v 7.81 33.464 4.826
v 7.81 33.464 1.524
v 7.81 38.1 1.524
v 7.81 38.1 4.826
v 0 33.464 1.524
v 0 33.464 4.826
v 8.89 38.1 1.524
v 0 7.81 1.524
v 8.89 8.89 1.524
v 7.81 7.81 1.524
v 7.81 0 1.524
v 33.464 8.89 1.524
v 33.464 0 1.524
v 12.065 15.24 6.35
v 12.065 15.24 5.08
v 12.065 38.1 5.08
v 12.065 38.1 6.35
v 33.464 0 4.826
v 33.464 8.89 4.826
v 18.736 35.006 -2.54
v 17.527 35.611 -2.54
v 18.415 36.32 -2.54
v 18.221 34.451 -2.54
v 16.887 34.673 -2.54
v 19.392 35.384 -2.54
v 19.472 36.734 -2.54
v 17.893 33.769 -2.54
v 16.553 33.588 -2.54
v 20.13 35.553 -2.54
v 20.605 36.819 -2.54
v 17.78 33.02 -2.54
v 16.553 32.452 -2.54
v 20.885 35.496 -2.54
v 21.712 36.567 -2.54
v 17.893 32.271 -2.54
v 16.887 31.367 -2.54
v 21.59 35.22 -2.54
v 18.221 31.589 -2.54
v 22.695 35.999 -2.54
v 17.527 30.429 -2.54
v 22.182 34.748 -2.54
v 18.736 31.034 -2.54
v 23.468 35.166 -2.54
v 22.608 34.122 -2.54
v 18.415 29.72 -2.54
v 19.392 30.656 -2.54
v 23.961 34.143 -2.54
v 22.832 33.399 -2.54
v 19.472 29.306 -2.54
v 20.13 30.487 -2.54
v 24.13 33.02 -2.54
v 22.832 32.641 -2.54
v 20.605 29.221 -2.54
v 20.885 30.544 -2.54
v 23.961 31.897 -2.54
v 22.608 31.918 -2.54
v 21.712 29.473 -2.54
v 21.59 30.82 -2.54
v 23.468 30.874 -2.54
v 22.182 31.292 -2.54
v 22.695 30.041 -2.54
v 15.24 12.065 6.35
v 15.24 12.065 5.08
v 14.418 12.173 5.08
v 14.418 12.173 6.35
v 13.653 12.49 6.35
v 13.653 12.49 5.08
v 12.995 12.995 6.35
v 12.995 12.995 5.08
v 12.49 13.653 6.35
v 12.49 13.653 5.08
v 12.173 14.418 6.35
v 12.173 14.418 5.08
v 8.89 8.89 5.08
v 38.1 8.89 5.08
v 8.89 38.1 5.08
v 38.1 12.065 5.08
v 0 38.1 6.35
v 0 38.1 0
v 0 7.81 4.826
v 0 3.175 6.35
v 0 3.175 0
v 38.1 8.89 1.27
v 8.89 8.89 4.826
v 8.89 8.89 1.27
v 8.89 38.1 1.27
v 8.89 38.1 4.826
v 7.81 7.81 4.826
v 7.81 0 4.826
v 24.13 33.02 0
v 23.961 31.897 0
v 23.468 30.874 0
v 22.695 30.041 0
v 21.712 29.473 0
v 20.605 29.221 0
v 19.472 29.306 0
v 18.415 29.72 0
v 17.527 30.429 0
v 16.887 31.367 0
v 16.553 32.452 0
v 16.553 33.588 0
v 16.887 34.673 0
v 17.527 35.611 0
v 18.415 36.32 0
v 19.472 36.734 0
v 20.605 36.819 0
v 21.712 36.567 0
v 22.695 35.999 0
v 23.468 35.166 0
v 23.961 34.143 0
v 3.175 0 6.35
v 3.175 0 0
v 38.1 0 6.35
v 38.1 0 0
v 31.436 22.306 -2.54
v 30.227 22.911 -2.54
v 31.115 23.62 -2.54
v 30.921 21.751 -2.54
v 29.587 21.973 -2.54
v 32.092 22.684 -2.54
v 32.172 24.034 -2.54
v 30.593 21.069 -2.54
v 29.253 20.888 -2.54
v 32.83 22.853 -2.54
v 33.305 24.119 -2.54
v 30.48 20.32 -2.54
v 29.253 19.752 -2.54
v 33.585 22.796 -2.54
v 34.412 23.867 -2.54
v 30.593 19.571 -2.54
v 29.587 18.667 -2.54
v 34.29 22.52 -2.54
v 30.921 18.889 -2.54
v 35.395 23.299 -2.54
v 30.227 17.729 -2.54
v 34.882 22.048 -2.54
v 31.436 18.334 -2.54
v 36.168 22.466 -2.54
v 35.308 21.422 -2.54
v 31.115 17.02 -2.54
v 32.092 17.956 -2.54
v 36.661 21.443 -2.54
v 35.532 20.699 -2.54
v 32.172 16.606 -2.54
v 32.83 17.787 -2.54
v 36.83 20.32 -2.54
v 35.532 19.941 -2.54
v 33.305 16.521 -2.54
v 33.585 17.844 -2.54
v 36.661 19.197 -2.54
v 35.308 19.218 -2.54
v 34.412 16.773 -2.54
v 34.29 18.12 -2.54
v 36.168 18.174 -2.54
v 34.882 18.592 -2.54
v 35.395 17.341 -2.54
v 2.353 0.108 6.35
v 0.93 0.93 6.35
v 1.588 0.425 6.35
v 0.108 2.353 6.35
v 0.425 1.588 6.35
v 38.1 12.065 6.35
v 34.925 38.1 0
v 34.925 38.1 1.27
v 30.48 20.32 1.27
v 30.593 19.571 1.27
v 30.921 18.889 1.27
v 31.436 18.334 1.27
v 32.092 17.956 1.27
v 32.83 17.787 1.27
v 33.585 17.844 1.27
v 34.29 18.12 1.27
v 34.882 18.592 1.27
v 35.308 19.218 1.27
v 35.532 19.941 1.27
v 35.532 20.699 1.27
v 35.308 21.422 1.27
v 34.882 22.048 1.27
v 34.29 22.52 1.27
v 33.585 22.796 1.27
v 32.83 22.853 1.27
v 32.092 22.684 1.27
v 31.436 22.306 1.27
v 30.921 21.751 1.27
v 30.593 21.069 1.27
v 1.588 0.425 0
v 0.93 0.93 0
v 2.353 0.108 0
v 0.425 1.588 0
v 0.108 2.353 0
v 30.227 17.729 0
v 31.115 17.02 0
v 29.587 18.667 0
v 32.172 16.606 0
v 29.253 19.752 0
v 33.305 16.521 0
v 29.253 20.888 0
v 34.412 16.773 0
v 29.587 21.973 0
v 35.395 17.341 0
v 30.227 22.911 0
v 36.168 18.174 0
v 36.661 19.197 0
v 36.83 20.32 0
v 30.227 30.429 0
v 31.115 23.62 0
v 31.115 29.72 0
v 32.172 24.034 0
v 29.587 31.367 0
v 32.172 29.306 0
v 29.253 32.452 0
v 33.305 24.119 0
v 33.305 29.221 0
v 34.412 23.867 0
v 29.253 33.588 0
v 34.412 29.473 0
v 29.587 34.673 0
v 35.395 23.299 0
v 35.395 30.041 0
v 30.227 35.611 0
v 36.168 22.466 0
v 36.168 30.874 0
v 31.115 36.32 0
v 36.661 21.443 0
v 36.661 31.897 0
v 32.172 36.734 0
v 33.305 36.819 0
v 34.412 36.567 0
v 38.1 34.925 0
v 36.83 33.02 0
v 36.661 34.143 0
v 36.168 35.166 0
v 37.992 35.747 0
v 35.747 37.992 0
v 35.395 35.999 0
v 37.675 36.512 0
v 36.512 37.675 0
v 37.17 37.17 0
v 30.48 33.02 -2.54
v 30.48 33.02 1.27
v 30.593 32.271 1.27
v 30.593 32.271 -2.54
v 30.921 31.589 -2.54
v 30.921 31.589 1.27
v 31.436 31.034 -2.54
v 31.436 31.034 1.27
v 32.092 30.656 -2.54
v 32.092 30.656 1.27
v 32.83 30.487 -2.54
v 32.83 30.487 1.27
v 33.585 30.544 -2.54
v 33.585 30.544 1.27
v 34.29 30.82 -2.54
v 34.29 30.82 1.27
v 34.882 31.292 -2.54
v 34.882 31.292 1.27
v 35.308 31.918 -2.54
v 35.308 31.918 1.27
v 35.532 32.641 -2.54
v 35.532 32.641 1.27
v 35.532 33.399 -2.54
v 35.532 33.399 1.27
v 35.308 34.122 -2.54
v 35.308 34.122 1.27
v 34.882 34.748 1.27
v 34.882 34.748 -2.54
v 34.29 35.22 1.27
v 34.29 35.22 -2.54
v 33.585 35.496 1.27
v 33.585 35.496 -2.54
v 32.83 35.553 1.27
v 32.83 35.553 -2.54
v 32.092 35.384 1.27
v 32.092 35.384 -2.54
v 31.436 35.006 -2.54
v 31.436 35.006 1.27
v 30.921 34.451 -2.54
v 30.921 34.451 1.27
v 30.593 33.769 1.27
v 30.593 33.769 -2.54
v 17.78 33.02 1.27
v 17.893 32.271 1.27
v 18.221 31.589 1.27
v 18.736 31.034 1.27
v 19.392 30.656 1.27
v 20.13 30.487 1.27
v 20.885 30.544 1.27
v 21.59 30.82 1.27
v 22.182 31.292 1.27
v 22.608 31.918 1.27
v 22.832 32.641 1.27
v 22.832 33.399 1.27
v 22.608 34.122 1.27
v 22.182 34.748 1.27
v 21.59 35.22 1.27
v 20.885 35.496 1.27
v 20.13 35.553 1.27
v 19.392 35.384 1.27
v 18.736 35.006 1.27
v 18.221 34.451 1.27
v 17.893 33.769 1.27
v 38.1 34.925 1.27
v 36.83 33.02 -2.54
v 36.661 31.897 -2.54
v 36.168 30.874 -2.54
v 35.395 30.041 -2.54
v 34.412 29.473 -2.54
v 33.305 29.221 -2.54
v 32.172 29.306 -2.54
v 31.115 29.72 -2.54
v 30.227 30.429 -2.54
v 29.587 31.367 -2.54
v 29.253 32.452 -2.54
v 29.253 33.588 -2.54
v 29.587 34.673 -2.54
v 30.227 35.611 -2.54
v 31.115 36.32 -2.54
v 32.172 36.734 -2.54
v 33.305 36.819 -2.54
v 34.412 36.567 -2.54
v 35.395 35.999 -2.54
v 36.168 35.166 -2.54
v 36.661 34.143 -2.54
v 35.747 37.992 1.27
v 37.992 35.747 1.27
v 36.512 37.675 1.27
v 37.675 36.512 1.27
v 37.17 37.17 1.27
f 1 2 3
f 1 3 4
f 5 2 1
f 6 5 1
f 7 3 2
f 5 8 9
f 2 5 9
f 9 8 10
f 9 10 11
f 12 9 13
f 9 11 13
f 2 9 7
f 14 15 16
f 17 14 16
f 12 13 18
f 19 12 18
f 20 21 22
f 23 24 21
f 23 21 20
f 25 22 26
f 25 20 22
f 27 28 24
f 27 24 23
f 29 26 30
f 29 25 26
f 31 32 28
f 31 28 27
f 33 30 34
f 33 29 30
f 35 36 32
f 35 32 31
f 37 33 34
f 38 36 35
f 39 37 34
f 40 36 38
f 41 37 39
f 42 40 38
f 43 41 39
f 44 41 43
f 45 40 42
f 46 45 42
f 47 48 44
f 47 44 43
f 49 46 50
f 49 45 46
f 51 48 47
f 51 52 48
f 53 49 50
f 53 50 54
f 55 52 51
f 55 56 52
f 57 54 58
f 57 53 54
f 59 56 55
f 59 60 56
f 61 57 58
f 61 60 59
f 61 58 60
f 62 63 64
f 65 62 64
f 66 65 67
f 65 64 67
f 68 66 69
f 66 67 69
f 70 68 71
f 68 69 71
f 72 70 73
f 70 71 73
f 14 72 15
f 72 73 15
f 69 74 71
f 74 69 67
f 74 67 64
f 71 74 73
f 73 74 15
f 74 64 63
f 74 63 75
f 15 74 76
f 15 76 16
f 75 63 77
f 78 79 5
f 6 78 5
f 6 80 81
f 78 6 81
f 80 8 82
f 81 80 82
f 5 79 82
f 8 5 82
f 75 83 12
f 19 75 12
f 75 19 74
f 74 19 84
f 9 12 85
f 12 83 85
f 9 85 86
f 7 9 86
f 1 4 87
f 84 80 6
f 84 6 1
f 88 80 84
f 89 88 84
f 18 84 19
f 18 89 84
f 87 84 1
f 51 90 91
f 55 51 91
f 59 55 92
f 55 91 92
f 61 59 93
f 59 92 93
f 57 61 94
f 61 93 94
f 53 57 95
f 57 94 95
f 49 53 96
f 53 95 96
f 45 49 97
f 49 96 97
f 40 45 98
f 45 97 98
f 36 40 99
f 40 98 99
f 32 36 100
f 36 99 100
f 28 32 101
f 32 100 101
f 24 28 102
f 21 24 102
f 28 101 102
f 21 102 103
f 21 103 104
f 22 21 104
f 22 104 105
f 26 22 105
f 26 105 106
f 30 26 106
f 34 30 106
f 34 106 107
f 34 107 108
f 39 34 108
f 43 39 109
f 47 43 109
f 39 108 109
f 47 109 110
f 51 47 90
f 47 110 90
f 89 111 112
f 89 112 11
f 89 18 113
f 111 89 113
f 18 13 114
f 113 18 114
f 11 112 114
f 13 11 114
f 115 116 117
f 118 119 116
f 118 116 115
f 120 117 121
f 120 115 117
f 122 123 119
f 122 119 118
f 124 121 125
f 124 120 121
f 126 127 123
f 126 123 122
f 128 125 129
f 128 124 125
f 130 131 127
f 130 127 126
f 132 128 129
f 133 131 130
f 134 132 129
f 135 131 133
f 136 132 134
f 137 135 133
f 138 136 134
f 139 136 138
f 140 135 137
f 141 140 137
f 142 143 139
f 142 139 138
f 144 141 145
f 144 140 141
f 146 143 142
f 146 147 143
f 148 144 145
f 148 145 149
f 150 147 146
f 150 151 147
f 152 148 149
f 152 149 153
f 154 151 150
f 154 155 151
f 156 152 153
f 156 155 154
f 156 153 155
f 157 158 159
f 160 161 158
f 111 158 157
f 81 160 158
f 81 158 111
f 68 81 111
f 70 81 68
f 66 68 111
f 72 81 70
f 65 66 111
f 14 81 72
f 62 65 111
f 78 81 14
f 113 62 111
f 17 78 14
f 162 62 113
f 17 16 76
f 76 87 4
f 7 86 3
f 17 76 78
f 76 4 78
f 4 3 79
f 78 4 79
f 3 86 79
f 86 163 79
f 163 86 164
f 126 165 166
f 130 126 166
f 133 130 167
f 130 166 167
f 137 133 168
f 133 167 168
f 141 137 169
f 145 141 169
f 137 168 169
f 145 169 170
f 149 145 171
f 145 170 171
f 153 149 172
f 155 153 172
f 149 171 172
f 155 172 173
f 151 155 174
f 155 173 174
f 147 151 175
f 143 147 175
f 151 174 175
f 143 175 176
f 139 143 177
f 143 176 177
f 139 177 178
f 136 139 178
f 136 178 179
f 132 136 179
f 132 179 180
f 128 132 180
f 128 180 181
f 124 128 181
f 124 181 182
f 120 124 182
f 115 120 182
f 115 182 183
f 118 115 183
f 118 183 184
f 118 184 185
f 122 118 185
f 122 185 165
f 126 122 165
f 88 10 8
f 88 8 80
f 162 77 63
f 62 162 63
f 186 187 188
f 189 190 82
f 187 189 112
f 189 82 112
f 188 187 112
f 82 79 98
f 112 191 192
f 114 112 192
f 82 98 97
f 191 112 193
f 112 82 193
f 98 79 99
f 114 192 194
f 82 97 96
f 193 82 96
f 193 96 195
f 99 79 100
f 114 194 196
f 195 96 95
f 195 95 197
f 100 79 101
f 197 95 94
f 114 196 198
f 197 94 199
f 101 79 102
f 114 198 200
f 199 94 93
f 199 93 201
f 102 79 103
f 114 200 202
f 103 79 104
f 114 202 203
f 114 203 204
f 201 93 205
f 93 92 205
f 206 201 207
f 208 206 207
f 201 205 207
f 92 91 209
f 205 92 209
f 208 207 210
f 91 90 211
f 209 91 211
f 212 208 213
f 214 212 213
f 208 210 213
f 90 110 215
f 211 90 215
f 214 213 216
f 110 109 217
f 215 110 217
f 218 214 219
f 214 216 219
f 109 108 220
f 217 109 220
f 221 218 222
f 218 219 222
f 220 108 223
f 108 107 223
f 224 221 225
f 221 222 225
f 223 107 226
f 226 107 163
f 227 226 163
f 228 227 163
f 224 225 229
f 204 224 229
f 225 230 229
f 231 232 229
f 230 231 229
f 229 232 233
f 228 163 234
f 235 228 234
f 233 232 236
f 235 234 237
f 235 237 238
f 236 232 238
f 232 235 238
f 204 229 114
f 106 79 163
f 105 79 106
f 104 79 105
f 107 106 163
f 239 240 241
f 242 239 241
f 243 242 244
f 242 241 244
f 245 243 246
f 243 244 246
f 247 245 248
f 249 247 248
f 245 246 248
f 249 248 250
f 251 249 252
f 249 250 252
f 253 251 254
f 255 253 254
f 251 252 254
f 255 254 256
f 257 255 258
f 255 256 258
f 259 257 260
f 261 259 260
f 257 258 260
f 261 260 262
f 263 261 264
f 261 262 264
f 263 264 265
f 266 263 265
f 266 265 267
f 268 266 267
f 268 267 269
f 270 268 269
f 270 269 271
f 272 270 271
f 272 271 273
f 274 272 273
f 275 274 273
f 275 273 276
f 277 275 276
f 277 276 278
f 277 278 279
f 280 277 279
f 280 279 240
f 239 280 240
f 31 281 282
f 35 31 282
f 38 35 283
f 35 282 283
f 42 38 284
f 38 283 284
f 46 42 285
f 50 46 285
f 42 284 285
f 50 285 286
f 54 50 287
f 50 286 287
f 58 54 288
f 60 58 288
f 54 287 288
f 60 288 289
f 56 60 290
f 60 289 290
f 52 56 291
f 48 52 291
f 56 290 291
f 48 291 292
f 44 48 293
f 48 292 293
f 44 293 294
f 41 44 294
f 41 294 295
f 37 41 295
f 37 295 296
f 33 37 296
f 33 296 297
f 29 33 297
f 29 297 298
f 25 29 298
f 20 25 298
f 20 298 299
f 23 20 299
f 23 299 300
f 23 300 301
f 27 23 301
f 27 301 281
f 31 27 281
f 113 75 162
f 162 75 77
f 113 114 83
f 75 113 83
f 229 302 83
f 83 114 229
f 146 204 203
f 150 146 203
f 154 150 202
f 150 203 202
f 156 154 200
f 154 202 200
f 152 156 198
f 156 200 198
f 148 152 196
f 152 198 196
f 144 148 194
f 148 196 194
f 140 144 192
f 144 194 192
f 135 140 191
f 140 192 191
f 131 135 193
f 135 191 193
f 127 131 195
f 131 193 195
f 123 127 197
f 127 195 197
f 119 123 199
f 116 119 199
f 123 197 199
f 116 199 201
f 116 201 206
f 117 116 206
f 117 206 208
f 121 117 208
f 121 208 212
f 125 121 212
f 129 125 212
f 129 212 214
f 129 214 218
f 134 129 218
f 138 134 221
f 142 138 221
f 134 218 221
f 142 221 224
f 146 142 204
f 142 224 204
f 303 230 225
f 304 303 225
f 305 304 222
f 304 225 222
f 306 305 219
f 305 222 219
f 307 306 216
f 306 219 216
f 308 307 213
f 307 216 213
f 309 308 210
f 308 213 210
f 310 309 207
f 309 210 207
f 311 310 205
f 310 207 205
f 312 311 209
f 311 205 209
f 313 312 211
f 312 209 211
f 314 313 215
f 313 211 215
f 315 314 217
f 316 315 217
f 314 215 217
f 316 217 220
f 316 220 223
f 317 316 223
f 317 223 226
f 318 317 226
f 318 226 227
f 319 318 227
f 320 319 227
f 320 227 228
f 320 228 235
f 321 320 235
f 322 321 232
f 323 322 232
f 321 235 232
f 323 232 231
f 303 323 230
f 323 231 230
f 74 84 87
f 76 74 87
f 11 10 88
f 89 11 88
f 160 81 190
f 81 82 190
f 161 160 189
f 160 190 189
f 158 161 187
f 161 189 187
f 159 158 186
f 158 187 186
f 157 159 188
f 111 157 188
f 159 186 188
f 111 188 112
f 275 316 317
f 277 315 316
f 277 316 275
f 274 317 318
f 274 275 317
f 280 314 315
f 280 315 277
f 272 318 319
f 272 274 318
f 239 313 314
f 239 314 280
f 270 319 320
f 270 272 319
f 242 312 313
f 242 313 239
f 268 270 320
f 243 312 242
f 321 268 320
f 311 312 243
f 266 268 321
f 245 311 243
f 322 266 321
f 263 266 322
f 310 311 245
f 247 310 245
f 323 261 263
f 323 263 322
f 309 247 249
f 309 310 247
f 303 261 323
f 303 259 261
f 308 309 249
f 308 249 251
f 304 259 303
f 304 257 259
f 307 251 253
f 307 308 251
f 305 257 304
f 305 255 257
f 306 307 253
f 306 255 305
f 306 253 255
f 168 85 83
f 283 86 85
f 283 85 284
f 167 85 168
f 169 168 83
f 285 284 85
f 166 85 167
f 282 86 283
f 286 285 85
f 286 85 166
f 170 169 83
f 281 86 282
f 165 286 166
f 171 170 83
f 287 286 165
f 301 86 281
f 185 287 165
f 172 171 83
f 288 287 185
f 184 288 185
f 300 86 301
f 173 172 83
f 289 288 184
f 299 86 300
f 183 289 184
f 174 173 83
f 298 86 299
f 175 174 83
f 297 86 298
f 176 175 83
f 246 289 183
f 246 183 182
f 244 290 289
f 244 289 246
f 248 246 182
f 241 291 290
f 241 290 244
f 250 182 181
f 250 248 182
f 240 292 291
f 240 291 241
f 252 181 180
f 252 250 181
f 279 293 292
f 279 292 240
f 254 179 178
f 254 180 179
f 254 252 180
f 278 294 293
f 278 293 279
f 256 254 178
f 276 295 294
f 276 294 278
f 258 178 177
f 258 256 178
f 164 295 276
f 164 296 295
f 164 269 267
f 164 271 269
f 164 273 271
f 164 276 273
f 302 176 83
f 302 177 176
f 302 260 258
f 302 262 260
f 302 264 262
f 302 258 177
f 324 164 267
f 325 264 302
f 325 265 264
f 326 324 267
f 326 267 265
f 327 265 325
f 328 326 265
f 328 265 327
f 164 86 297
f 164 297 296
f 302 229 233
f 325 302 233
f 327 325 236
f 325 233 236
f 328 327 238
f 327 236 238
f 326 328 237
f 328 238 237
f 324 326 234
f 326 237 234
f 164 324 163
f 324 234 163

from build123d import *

# Parameters (mm, degrees)
F1_DEPTH  = 1.27
F3_DEPTH  = 3.81
F5_DEPTH  = 1.27
F6_W      = 25.654
F6_H      = 3.302
F7_DEPTH  = 38.101
F8_W      = 25.654
F8_H      = 3.302
F9_DEPTH  = 25.4
F10_R     = 3.81
F11_DEPTH = 2.54
F13_D     = 5.08


with BuildPart() as f1:
    # F0 (on Top) → F1 (new body)
    with BuildSketch(Plane.XY):
        with BuildLine():
            Line((0, 38.1), (0, 3.175))
            ThreePointArc((0, 3.175), (0.929936, 0.929936), (3.175, 0))
            Line((3.175, 0), (38.1, 0))
            Line((38.1, 0), (38.1, 34.925))
            ThreePointArc((38.1, 34.925), (37.170064, 37.170064), (34.925, 38.1))
            Line((34.925, 38.1), (0, 38.1))
        make_face()
    extrude(amount=F1_DEPTH)

    # F2 (on face) → F3 (join)
    with BuildSketch(Plane.XY.offset(1.27)):
        with BuildLine():
            Line((0, 38.1), (0, 3.175))
            ThreePointArc((0, 3.175), (0.929936, 0.929936), (3.175, 0))
            Line((3.175, 0), (38.1, 0))
            Line((38.1, 0), (38.1, 8.89))
            Line((38.1, 8.89), (8.89, 8.89))
            Line((8.89, 8.89), (8.89, 38.1))
            Line((8.89, 38.1), (0, 38.1))
        make_face()
    extrude(amount=F3_DEPTH)

    # F4 (on face) → F5 (join)
    with BuildSketch(Plane.XY.offset(5.08)):
        with BuildLine():
            Line((12.065, 38.1), (8.89, 38.1))
            Line((8.89, 38.1), (0, 38.1))
            Line((0, 38.1), (0, 3.175))
            ThreePointArc((0, 3.175), (0.929936, 0.929936), (3.175, 0))
            Line((3.175, 0), (38.1, 0))
            Line((38.1, 0), (38.1, 8.89))
            Line((38.1, 8.89), (38.1, 12.065))
            Line((38.1, 12.065), (15.24, 12.065))
            ThreePointArc((15.24, 12.065), (12.994936, 12.994936), (12.065, 15.24))
            Line((12.065, 15.24), (12.065, 38.1))
        make_face()
    extrude(amount=F5_DEPTH)

    # F6 (on face) → F7 (cut, through all)
    with BuildSketch(Plane.XZ):
        with Locations((20.6375, 3.175)):
            Rectangle(F6_W, F6_H)
    extrude(amount=-F7_DEPTH, mode=Mode.SUBTRACT)

    # F8 (on face) → F9 (cut)
    with BuildSketch(Plane(origin=(0, 0, 0), x_dir=(0, -1, 0), z_dir=(-1, 0, 0))):
        with Locations((-20.6375, 3.175)):
            Rectangle(F8_W, F8_H)
    extrude(amount=-F9_DEPTH, mode=Mode.SUBTRACT)

    # F10 (on face) → F11 (join)
    with BuildSketch(Plane(origin=(0, 0, 0), x_dir=(1, 0, 0), z_dir=(0, 0, -1))):
        with Locations((33.02, -33.02)):
            Circle(F10_R)
        with Locations((33.02, -20.32)):
            Circle(F10_R)
        with Locations((20.32, -33.02)):
            Circle(F10_R)
    extrude(amount=F11_DEPTH)

    # F13 (through all)
    with Locations(Plane(origin=(0, 0, -2.54), x_dir=(1, 0, 0), z_dir=(0, 0, -1))):
        with Locations((20.32, -33.02), (33.02, -33.02), (33.02, -20.32)):
            Hole(F13_D / 2)


solid = f1.part
